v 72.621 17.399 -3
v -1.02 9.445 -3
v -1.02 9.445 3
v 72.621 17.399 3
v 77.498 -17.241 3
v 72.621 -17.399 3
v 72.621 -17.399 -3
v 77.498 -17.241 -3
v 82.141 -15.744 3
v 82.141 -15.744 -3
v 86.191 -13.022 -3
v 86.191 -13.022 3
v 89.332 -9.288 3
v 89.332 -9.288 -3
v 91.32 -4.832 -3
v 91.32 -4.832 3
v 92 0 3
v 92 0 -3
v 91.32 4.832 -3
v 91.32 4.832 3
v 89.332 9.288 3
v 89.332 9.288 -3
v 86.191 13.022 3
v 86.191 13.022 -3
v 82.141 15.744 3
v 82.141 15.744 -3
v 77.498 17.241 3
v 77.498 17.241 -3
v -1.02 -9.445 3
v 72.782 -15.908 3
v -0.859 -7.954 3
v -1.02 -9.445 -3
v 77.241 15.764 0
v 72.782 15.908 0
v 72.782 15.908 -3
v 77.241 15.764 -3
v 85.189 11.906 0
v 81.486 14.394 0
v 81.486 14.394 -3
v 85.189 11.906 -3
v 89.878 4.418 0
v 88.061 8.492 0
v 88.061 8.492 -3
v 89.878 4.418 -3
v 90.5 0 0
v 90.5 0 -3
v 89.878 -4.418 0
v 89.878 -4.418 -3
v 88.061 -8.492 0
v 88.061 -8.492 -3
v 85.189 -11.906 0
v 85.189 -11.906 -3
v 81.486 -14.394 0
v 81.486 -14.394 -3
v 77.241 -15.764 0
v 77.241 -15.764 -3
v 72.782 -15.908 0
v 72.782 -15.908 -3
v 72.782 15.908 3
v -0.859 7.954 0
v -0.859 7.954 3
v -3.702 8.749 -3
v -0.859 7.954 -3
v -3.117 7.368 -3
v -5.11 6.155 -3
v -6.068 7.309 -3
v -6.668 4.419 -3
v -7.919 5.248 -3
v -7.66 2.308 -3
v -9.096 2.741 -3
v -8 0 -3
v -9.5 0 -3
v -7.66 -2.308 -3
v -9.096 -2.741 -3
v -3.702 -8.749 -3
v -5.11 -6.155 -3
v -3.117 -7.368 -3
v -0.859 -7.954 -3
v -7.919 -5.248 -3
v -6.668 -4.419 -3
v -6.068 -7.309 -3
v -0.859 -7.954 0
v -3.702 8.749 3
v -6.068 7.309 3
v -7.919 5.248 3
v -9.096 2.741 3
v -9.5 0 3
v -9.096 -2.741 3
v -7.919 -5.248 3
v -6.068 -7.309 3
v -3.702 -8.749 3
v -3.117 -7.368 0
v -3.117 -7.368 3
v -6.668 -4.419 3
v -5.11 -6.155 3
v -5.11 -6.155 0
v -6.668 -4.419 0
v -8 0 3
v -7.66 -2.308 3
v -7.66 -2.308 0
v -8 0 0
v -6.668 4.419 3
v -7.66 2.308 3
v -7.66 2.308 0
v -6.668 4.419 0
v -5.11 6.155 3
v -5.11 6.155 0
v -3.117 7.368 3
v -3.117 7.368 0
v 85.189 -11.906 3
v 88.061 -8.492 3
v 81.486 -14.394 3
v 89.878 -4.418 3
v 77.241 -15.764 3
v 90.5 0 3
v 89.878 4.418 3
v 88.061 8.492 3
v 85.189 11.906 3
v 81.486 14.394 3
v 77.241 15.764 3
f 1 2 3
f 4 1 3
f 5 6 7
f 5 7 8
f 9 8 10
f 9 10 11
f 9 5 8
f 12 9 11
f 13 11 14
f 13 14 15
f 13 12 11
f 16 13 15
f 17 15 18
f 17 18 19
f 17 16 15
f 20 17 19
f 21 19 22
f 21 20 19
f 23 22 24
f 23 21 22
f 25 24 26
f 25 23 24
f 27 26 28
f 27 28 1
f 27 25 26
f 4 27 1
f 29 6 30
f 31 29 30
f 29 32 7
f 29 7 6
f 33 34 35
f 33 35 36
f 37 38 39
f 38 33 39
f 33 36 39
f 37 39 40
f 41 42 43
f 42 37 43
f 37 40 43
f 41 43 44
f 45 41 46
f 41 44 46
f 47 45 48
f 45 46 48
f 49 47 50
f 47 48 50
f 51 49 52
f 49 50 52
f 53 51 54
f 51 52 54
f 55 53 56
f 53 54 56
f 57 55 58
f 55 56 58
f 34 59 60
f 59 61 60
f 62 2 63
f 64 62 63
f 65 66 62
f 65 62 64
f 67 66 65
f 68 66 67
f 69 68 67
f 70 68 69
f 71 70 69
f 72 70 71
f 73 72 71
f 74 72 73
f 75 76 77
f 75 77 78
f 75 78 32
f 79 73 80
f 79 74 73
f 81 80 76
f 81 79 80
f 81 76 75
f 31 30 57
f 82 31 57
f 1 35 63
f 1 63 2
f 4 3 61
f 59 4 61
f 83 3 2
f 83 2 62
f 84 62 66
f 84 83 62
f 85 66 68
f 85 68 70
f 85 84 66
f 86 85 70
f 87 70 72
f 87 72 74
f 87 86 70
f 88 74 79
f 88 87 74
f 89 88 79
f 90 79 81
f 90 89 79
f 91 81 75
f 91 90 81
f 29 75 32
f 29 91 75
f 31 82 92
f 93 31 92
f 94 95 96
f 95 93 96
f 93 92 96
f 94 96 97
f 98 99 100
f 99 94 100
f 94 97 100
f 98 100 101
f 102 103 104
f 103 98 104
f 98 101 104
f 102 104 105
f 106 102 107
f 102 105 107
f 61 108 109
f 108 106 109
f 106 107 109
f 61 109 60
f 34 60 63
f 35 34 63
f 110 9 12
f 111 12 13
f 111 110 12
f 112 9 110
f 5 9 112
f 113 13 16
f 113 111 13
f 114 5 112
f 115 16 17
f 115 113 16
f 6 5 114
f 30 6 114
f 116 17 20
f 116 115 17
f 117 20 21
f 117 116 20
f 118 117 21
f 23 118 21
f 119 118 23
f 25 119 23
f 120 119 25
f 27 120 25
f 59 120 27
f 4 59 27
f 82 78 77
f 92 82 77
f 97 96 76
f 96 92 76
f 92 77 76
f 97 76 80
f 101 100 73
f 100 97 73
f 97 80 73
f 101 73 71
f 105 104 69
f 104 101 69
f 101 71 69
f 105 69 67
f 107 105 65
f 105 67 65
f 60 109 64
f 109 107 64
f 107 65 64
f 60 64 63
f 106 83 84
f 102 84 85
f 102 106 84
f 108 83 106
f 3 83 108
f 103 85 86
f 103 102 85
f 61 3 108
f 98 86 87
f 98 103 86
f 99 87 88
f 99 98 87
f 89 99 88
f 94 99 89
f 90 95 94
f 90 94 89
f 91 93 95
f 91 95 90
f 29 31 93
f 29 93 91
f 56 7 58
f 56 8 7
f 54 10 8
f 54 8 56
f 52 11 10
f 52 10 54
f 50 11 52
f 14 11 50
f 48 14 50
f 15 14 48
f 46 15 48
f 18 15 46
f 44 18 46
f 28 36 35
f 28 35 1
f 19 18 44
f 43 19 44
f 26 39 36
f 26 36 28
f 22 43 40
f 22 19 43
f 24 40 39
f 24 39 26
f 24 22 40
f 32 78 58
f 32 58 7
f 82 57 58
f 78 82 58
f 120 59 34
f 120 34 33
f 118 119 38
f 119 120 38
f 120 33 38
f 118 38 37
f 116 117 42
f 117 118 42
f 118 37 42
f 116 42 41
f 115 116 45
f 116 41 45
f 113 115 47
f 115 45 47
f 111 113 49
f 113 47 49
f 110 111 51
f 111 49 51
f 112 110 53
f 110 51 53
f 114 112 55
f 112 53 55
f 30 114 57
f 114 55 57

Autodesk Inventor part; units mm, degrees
ref_plane "YZ Plane" through (0, 0, 0) normal (1, 0, 0) x (0, 1, 0)
ref_plane "XZ Plane" through (0, 0, 0) normal (0, 1, 0) x (-1, 0, 0)
ref_plane "XY Plane" through (0, 0, 0) normal (0, 0, 1) x (1, 0, 0)
sketch "Sketch3" plane through (0, 0, 0) normal (0, 1, 0) x (-1, 0, 0)
  line L0 (0, 0) -> (8, 0) construction
  line L1 (8, 0) -> (8, -3)
  line L2 (8, -3) -> (9.5, -3)
  line L3 (9.5, -3) -> (9.5, 3)
  line L4 (9.5, 3) -> (8, 3)
  line L5 (8, 3) -> (8, 0)
  dimension "d9" = 1.5
  dimension "d10" = 6
  dimension "d11" = 8
sketch "Sketch1" plane through (0, 0, 0) normal (0, 0, 1) x (1, 0, 0)
  line L0 (0, 0) -> (74.5, 0) construction
  arc A0 (72.7819, -15.9075) -> (72.7819, 15.9075) centre (74.5, 0) ccw
  arc A1 (-0.8591, 7.9537) -> (-0.8591, -7.9537) centre (0, 0) ccw
  line L1 (-0.8591, 7.9537) -> (72.7819, 15.9075)
  line L2 (-0.8591, -7.9537) -> (72.7819, -15.9075)
  dimension "d0" = 74.5
  dimension "d2" = 16
  dimension "d8" = 32
sweep "Sweep1" add profiles "Sketch3" path "Sketch1"
properties part number "Conrod"
